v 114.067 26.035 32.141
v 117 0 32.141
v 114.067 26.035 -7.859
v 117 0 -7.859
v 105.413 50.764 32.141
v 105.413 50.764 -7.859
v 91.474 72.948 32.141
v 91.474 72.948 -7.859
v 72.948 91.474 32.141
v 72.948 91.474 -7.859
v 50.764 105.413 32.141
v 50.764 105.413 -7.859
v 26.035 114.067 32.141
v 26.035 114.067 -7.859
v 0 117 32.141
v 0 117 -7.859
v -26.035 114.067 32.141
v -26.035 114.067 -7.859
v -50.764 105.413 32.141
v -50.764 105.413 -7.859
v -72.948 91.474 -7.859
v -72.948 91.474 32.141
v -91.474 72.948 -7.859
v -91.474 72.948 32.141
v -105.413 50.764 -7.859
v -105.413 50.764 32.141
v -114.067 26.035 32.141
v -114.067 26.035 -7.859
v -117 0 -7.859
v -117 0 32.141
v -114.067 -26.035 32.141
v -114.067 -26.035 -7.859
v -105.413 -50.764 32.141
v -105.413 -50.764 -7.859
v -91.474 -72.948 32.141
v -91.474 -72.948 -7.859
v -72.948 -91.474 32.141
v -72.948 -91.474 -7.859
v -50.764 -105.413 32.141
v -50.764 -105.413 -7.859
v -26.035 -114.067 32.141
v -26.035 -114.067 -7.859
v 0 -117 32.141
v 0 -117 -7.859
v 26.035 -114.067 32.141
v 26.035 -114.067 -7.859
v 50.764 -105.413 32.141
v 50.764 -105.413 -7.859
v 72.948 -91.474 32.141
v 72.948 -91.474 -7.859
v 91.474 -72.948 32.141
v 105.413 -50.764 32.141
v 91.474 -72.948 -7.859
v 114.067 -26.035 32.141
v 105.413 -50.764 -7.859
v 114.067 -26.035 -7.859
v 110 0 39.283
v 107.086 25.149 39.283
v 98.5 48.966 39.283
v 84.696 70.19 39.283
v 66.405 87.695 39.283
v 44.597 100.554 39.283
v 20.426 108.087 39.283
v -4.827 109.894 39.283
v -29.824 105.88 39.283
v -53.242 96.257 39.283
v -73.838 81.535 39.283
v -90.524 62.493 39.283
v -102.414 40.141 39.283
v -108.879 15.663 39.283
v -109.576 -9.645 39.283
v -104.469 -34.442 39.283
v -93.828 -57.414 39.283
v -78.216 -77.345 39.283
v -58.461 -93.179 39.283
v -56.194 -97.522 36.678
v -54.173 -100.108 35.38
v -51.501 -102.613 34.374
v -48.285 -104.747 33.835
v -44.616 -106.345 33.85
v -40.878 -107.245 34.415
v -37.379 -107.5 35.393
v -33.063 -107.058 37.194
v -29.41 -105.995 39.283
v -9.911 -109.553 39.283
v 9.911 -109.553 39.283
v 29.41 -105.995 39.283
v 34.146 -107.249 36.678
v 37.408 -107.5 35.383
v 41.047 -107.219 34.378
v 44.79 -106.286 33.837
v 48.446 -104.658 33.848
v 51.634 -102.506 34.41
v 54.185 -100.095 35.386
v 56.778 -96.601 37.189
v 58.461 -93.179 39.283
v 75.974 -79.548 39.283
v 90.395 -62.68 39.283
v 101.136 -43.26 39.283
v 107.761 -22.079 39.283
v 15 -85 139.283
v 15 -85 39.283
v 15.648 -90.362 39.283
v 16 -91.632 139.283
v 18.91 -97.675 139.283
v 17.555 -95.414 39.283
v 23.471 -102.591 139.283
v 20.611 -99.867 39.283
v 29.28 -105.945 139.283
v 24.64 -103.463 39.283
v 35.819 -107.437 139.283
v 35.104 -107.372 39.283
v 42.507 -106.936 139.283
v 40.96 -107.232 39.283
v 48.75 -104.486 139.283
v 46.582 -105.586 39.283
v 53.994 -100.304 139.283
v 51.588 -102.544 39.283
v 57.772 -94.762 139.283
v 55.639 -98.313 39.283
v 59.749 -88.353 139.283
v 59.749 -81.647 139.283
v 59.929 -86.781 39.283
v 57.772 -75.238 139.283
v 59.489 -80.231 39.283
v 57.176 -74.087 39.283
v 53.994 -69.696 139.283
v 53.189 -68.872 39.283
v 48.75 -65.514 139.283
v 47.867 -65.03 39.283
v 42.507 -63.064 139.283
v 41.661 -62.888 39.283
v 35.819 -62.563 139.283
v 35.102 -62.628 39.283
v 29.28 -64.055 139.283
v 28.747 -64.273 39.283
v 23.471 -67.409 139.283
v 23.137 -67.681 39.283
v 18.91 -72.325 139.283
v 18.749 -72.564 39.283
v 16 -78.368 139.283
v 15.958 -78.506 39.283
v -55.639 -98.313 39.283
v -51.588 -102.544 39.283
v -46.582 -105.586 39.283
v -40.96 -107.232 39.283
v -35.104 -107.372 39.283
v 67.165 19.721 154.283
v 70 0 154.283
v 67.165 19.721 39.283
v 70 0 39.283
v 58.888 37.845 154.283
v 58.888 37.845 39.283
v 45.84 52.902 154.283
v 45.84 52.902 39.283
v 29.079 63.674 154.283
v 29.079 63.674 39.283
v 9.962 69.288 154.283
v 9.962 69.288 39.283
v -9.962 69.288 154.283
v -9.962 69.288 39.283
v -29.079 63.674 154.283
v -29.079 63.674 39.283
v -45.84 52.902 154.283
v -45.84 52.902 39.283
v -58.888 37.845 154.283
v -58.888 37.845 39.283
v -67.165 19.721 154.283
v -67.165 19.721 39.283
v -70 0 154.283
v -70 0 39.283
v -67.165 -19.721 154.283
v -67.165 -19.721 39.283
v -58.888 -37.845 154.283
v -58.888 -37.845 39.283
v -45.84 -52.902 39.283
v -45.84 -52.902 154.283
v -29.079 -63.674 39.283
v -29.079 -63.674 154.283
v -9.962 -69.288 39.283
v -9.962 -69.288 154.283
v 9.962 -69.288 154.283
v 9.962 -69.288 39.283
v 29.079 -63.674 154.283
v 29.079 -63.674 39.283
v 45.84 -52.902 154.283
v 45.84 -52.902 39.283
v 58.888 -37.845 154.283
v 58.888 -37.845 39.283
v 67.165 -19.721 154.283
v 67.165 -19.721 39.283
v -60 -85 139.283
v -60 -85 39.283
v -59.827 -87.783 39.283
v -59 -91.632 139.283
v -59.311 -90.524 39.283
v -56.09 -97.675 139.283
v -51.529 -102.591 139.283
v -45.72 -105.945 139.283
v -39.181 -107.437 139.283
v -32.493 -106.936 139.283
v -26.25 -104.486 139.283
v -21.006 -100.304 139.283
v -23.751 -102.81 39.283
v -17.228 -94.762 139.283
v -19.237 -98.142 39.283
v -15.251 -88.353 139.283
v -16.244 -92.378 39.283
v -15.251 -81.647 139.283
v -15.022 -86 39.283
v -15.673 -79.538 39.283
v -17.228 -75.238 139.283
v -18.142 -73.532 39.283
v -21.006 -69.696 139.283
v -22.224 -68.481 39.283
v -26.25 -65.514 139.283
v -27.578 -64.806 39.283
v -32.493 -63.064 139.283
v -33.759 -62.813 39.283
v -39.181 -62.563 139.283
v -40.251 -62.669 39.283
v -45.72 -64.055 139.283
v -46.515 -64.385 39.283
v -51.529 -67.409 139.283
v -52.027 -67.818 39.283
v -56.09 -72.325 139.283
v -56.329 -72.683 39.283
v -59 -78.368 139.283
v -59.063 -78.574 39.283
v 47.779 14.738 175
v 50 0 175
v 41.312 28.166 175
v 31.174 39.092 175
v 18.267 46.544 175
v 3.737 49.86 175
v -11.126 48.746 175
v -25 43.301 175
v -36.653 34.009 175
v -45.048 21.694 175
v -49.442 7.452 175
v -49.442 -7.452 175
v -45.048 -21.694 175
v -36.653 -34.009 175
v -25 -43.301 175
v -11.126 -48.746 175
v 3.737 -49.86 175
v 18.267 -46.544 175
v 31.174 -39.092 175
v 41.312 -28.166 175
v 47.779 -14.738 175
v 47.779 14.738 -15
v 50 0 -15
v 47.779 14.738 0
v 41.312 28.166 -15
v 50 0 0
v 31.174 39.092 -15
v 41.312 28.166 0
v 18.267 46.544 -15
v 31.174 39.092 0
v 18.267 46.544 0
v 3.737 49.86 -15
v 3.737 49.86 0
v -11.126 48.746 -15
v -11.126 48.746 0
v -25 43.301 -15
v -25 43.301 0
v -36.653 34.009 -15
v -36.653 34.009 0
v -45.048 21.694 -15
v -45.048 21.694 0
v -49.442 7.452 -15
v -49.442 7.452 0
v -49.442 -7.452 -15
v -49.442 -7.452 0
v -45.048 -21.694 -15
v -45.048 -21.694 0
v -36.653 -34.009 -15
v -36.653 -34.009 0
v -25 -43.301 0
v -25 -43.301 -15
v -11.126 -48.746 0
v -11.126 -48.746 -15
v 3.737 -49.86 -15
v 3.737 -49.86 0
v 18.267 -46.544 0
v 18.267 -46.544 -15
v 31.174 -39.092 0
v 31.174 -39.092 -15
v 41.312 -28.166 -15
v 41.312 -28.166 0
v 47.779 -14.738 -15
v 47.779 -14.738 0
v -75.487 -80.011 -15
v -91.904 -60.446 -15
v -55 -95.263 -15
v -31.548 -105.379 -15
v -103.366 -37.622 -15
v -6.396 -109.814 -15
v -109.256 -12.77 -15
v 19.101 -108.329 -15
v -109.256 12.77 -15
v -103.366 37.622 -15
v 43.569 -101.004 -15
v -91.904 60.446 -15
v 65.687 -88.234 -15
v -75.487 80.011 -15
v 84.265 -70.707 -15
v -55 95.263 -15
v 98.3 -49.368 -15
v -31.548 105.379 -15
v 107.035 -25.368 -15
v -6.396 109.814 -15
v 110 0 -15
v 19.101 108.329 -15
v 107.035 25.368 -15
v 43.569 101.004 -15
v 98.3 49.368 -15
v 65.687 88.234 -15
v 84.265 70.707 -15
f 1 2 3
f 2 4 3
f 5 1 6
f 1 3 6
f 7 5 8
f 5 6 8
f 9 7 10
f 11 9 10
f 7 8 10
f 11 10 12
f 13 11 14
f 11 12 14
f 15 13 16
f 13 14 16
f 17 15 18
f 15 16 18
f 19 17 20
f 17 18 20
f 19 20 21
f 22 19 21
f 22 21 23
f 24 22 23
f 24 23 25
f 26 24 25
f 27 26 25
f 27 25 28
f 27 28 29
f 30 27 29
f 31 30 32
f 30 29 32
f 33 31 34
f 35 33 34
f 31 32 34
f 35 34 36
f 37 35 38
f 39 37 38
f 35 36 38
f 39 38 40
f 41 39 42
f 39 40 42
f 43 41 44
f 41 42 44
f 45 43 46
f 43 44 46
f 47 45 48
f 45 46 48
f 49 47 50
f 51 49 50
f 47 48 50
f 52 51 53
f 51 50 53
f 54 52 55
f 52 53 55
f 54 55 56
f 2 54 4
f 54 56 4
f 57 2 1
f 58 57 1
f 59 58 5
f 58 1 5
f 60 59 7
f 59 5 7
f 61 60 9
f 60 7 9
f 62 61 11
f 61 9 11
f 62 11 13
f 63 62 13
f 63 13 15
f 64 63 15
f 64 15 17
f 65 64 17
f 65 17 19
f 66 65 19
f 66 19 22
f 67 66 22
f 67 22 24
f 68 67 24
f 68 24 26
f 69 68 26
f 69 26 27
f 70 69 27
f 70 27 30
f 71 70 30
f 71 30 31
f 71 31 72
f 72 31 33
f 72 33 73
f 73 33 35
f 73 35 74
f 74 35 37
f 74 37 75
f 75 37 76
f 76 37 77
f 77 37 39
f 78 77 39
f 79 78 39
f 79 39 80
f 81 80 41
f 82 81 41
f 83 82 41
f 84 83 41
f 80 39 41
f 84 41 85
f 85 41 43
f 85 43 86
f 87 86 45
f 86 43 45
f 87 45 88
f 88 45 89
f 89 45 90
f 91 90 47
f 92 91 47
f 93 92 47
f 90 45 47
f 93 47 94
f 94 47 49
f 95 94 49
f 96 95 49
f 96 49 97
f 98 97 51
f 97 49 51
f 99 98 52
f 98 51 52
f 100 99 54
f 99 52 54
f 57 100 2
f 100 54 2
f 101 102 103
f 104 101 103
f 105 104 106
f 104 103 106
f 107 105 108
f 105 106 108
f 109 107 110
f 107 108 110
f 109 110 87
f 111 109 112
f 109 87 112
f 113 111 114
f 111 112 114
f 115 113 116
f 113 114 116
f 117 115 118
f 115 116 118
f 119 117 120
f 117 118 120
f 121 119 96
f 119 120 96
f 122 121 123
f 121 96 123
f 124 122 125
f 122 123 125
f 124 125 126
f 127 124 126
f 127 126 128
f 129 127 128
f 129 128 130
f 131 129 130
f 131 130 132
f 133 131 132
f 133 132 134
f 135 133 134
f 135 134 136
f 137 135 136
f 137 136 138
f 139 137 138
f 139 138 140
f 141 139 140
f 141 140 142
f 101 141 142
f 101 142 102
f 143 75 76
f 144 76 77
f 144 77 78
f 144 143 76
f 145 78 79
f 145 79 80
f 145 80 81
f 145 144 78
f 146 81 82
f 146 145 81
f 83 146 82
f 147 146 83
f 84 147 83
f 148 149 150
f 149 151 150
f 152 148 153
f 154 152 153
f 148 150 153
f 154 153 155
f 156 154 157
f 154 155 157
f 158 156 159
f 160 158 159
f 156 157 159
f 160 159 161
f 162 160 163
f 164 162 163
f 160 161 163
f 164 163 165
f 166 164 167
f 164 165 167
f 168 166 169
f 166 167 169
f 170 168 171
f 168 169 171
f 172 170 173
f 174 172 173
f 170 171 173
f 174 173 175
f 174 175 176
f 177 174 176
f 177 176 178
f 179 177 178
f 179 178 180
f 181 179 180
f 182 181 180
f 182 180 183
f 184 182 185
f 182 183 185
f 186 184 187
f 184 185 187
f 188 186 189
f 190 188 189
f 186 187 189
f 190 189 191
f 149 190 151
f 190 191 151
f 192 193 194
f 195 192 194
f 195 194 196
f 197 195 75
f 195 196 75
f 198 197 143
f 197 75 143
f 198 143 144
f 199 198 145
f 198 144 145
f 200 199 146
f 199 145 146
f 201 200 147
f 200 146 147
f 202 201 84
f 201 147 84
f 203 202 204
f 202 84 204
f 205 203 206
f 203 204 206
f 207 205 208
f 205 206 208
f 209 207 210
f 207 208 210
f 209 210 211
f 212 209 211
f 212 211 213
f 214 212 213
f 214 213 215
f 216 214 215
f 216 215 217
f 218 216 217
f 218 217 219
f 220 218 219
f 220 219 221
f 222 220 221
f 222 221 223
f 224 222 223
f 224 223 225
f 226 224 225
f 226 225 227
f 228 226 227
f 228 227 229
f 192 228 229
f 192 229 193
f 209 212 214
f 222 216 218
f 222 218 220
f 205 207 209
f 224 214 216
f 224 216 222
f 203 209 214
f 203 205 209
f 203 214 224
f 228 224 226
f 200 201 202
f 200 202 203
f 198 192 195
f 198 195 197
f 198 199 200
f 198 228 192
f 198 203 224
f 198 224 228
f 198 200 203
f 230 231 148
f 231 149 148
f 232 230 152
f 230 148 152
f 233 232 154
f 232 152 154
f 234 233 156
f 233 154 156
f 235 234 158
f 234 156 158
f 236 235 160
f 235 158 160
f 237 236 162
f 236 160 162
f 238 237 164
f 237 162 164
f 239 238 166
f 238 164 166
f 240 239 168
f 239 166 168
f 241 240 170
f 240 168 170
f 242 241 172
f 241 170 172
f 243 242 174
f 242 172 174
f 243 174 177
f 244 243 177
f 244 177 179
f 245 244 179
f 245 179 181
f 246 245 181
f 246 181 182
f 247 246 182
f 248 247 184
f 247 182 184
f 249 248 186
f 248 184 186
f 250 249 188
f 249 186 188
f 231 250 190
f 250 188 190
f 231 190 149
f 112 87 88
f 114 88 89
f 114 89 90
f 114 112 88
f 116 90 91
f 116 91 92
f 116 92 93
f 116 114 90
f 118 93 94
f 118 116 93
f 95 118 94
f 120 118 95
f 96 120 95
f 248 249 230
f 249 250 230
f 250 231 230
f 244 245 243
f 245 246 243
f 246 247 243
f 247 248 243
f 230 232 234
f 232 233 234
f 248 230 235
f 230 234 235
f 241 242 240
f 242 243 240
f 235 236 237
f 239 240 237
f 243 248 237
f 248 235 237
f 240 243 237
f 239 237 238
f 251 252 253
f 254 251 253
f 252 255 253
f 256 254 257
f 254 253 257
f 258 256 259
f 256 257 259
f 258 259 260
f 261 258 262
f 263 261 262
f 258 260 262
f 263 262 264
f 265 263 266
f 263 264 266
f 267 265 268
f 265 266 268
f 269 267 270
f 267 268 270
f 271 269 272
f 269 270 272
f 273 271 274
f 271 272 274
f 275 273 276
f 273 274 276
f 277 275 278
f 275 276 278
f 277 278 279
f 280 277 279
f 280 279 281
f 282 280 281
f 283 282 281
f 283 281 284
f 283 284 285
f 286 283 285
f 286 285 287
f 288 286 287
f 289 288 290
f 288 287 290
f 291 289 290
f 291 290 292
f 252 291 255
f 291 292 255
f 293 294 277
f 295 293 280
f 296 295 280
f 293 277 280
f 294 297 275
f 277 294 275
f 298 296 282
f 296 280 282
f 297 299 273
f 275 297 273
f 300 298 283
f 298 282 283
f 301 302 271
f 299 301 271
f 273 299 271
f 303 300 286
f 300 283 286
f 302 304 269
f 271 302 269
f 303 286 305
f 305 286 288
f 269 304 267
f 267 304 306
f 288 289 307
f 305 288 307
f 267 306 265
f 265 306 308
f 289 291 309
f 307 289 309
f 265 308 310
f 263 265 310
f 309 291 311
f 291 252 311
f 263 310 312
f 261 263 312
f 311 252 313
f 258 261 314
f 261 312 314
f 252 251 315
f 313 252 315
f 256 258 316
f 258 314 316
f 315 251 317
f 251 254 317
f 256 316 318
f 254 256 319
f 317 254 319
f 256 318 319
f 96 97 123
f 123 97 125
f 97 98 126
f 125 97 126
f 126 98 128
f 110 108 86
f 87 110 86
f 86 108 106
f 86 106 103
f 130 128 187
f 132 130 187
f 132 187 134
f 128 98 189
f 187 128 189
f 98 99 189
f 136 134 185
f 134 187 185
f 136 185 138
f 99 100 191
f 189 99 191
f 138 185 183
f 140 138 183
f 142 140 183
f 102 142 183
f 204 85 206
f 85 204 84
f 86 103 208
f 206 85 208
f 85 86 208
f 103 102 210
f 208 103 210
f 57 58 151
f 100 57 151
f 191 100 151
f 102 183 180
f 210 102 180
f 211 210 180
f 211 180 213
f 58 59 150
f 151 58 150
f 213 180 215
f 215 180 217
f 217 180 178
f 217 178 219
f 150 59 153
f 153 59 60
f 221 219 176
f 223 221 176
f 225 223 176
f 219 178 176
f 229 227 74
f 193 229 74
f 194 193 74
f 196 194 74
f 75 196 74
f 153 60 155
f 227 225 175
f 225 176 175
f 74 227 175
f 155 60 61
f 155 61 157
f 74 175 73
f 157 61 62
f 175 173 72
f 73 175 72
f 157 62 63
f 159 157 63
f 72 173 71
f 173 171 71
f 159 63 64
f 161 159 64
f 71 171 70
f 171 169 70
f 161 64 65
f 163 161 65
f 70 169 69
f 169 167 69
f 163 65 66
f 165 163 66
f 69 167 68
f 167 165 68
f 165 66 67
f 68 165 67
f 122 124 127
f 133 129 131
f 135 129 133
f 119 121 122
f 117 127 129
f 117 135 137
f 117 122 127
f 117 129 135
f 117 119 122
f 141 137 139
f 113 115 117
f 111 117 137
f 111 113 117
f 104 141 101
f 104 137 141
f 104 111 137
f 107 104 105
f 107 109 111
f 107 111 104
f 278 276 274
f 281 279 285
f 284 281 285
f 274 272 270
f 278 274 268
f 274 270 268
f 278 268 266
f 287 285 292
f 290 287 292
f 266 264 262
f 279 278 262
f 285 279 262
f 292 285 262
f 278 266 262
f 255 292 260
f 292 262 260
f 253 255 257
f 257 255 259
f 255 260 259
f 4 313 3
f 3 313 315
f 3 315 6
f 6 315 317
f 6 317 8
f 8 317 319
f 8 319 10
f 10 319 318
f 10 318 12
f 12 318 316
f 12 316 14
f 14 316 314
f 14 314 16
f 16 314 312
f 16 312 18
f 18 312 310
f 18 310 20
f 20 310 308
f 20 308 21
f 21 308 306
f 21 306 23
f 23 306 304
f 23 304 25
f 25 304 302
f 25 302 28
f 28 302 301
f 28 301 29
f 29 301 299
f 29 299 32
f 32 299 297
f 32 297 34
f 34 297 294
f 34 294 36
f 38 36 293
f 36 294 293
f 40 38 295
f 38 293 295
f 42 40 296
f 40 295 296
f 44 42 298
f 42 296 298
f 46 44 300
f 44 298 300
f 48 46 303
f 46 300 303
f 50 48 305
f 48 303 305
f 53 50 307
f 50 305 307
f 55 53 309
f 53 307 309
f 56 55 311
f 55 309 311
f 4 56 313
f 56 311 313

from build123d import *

# Parameters (mm, degrees)
SKETCH001_R    = 22.5
PAD_DEPTH      = 100
PAD_DEPTH_BACK = 40


with BuildPart() as part:
    # Sketch → Revolution (revolve)
    with BuildSketch(Plane.XZ):
        Polygon((70, 39.282857), (110, 39.282857), (117, 32.141428), (117, -7.858572), (110, -15), (50, -15), (50, 0), (0, 0), (0, 175), (50, 175), (70, 154.282857), align=None)
    revolve(axis=Axis((0, 0, 0), (0, 0, 1)))

    # Sketch001 (on Face1 of Revolution) → Pad (new body, two sides)
    with BuildSketch(Plane(origin=(0, 0, 39.282857), x_dir=(-1, 0, 0), z_dir=(0, 0, 1))) as pad_sk:
        with Locations((-37.5, 85)):
            Circle(SKETCH001_R)
        with Locations((37.5, 85)):
            Circle(SKETCH001_R)
    extrude(amount=PAD_DEPTH)
    extrude(pad_sk.sketch, amount=-PAD_DEPTH_BACK)


solid = part.part
